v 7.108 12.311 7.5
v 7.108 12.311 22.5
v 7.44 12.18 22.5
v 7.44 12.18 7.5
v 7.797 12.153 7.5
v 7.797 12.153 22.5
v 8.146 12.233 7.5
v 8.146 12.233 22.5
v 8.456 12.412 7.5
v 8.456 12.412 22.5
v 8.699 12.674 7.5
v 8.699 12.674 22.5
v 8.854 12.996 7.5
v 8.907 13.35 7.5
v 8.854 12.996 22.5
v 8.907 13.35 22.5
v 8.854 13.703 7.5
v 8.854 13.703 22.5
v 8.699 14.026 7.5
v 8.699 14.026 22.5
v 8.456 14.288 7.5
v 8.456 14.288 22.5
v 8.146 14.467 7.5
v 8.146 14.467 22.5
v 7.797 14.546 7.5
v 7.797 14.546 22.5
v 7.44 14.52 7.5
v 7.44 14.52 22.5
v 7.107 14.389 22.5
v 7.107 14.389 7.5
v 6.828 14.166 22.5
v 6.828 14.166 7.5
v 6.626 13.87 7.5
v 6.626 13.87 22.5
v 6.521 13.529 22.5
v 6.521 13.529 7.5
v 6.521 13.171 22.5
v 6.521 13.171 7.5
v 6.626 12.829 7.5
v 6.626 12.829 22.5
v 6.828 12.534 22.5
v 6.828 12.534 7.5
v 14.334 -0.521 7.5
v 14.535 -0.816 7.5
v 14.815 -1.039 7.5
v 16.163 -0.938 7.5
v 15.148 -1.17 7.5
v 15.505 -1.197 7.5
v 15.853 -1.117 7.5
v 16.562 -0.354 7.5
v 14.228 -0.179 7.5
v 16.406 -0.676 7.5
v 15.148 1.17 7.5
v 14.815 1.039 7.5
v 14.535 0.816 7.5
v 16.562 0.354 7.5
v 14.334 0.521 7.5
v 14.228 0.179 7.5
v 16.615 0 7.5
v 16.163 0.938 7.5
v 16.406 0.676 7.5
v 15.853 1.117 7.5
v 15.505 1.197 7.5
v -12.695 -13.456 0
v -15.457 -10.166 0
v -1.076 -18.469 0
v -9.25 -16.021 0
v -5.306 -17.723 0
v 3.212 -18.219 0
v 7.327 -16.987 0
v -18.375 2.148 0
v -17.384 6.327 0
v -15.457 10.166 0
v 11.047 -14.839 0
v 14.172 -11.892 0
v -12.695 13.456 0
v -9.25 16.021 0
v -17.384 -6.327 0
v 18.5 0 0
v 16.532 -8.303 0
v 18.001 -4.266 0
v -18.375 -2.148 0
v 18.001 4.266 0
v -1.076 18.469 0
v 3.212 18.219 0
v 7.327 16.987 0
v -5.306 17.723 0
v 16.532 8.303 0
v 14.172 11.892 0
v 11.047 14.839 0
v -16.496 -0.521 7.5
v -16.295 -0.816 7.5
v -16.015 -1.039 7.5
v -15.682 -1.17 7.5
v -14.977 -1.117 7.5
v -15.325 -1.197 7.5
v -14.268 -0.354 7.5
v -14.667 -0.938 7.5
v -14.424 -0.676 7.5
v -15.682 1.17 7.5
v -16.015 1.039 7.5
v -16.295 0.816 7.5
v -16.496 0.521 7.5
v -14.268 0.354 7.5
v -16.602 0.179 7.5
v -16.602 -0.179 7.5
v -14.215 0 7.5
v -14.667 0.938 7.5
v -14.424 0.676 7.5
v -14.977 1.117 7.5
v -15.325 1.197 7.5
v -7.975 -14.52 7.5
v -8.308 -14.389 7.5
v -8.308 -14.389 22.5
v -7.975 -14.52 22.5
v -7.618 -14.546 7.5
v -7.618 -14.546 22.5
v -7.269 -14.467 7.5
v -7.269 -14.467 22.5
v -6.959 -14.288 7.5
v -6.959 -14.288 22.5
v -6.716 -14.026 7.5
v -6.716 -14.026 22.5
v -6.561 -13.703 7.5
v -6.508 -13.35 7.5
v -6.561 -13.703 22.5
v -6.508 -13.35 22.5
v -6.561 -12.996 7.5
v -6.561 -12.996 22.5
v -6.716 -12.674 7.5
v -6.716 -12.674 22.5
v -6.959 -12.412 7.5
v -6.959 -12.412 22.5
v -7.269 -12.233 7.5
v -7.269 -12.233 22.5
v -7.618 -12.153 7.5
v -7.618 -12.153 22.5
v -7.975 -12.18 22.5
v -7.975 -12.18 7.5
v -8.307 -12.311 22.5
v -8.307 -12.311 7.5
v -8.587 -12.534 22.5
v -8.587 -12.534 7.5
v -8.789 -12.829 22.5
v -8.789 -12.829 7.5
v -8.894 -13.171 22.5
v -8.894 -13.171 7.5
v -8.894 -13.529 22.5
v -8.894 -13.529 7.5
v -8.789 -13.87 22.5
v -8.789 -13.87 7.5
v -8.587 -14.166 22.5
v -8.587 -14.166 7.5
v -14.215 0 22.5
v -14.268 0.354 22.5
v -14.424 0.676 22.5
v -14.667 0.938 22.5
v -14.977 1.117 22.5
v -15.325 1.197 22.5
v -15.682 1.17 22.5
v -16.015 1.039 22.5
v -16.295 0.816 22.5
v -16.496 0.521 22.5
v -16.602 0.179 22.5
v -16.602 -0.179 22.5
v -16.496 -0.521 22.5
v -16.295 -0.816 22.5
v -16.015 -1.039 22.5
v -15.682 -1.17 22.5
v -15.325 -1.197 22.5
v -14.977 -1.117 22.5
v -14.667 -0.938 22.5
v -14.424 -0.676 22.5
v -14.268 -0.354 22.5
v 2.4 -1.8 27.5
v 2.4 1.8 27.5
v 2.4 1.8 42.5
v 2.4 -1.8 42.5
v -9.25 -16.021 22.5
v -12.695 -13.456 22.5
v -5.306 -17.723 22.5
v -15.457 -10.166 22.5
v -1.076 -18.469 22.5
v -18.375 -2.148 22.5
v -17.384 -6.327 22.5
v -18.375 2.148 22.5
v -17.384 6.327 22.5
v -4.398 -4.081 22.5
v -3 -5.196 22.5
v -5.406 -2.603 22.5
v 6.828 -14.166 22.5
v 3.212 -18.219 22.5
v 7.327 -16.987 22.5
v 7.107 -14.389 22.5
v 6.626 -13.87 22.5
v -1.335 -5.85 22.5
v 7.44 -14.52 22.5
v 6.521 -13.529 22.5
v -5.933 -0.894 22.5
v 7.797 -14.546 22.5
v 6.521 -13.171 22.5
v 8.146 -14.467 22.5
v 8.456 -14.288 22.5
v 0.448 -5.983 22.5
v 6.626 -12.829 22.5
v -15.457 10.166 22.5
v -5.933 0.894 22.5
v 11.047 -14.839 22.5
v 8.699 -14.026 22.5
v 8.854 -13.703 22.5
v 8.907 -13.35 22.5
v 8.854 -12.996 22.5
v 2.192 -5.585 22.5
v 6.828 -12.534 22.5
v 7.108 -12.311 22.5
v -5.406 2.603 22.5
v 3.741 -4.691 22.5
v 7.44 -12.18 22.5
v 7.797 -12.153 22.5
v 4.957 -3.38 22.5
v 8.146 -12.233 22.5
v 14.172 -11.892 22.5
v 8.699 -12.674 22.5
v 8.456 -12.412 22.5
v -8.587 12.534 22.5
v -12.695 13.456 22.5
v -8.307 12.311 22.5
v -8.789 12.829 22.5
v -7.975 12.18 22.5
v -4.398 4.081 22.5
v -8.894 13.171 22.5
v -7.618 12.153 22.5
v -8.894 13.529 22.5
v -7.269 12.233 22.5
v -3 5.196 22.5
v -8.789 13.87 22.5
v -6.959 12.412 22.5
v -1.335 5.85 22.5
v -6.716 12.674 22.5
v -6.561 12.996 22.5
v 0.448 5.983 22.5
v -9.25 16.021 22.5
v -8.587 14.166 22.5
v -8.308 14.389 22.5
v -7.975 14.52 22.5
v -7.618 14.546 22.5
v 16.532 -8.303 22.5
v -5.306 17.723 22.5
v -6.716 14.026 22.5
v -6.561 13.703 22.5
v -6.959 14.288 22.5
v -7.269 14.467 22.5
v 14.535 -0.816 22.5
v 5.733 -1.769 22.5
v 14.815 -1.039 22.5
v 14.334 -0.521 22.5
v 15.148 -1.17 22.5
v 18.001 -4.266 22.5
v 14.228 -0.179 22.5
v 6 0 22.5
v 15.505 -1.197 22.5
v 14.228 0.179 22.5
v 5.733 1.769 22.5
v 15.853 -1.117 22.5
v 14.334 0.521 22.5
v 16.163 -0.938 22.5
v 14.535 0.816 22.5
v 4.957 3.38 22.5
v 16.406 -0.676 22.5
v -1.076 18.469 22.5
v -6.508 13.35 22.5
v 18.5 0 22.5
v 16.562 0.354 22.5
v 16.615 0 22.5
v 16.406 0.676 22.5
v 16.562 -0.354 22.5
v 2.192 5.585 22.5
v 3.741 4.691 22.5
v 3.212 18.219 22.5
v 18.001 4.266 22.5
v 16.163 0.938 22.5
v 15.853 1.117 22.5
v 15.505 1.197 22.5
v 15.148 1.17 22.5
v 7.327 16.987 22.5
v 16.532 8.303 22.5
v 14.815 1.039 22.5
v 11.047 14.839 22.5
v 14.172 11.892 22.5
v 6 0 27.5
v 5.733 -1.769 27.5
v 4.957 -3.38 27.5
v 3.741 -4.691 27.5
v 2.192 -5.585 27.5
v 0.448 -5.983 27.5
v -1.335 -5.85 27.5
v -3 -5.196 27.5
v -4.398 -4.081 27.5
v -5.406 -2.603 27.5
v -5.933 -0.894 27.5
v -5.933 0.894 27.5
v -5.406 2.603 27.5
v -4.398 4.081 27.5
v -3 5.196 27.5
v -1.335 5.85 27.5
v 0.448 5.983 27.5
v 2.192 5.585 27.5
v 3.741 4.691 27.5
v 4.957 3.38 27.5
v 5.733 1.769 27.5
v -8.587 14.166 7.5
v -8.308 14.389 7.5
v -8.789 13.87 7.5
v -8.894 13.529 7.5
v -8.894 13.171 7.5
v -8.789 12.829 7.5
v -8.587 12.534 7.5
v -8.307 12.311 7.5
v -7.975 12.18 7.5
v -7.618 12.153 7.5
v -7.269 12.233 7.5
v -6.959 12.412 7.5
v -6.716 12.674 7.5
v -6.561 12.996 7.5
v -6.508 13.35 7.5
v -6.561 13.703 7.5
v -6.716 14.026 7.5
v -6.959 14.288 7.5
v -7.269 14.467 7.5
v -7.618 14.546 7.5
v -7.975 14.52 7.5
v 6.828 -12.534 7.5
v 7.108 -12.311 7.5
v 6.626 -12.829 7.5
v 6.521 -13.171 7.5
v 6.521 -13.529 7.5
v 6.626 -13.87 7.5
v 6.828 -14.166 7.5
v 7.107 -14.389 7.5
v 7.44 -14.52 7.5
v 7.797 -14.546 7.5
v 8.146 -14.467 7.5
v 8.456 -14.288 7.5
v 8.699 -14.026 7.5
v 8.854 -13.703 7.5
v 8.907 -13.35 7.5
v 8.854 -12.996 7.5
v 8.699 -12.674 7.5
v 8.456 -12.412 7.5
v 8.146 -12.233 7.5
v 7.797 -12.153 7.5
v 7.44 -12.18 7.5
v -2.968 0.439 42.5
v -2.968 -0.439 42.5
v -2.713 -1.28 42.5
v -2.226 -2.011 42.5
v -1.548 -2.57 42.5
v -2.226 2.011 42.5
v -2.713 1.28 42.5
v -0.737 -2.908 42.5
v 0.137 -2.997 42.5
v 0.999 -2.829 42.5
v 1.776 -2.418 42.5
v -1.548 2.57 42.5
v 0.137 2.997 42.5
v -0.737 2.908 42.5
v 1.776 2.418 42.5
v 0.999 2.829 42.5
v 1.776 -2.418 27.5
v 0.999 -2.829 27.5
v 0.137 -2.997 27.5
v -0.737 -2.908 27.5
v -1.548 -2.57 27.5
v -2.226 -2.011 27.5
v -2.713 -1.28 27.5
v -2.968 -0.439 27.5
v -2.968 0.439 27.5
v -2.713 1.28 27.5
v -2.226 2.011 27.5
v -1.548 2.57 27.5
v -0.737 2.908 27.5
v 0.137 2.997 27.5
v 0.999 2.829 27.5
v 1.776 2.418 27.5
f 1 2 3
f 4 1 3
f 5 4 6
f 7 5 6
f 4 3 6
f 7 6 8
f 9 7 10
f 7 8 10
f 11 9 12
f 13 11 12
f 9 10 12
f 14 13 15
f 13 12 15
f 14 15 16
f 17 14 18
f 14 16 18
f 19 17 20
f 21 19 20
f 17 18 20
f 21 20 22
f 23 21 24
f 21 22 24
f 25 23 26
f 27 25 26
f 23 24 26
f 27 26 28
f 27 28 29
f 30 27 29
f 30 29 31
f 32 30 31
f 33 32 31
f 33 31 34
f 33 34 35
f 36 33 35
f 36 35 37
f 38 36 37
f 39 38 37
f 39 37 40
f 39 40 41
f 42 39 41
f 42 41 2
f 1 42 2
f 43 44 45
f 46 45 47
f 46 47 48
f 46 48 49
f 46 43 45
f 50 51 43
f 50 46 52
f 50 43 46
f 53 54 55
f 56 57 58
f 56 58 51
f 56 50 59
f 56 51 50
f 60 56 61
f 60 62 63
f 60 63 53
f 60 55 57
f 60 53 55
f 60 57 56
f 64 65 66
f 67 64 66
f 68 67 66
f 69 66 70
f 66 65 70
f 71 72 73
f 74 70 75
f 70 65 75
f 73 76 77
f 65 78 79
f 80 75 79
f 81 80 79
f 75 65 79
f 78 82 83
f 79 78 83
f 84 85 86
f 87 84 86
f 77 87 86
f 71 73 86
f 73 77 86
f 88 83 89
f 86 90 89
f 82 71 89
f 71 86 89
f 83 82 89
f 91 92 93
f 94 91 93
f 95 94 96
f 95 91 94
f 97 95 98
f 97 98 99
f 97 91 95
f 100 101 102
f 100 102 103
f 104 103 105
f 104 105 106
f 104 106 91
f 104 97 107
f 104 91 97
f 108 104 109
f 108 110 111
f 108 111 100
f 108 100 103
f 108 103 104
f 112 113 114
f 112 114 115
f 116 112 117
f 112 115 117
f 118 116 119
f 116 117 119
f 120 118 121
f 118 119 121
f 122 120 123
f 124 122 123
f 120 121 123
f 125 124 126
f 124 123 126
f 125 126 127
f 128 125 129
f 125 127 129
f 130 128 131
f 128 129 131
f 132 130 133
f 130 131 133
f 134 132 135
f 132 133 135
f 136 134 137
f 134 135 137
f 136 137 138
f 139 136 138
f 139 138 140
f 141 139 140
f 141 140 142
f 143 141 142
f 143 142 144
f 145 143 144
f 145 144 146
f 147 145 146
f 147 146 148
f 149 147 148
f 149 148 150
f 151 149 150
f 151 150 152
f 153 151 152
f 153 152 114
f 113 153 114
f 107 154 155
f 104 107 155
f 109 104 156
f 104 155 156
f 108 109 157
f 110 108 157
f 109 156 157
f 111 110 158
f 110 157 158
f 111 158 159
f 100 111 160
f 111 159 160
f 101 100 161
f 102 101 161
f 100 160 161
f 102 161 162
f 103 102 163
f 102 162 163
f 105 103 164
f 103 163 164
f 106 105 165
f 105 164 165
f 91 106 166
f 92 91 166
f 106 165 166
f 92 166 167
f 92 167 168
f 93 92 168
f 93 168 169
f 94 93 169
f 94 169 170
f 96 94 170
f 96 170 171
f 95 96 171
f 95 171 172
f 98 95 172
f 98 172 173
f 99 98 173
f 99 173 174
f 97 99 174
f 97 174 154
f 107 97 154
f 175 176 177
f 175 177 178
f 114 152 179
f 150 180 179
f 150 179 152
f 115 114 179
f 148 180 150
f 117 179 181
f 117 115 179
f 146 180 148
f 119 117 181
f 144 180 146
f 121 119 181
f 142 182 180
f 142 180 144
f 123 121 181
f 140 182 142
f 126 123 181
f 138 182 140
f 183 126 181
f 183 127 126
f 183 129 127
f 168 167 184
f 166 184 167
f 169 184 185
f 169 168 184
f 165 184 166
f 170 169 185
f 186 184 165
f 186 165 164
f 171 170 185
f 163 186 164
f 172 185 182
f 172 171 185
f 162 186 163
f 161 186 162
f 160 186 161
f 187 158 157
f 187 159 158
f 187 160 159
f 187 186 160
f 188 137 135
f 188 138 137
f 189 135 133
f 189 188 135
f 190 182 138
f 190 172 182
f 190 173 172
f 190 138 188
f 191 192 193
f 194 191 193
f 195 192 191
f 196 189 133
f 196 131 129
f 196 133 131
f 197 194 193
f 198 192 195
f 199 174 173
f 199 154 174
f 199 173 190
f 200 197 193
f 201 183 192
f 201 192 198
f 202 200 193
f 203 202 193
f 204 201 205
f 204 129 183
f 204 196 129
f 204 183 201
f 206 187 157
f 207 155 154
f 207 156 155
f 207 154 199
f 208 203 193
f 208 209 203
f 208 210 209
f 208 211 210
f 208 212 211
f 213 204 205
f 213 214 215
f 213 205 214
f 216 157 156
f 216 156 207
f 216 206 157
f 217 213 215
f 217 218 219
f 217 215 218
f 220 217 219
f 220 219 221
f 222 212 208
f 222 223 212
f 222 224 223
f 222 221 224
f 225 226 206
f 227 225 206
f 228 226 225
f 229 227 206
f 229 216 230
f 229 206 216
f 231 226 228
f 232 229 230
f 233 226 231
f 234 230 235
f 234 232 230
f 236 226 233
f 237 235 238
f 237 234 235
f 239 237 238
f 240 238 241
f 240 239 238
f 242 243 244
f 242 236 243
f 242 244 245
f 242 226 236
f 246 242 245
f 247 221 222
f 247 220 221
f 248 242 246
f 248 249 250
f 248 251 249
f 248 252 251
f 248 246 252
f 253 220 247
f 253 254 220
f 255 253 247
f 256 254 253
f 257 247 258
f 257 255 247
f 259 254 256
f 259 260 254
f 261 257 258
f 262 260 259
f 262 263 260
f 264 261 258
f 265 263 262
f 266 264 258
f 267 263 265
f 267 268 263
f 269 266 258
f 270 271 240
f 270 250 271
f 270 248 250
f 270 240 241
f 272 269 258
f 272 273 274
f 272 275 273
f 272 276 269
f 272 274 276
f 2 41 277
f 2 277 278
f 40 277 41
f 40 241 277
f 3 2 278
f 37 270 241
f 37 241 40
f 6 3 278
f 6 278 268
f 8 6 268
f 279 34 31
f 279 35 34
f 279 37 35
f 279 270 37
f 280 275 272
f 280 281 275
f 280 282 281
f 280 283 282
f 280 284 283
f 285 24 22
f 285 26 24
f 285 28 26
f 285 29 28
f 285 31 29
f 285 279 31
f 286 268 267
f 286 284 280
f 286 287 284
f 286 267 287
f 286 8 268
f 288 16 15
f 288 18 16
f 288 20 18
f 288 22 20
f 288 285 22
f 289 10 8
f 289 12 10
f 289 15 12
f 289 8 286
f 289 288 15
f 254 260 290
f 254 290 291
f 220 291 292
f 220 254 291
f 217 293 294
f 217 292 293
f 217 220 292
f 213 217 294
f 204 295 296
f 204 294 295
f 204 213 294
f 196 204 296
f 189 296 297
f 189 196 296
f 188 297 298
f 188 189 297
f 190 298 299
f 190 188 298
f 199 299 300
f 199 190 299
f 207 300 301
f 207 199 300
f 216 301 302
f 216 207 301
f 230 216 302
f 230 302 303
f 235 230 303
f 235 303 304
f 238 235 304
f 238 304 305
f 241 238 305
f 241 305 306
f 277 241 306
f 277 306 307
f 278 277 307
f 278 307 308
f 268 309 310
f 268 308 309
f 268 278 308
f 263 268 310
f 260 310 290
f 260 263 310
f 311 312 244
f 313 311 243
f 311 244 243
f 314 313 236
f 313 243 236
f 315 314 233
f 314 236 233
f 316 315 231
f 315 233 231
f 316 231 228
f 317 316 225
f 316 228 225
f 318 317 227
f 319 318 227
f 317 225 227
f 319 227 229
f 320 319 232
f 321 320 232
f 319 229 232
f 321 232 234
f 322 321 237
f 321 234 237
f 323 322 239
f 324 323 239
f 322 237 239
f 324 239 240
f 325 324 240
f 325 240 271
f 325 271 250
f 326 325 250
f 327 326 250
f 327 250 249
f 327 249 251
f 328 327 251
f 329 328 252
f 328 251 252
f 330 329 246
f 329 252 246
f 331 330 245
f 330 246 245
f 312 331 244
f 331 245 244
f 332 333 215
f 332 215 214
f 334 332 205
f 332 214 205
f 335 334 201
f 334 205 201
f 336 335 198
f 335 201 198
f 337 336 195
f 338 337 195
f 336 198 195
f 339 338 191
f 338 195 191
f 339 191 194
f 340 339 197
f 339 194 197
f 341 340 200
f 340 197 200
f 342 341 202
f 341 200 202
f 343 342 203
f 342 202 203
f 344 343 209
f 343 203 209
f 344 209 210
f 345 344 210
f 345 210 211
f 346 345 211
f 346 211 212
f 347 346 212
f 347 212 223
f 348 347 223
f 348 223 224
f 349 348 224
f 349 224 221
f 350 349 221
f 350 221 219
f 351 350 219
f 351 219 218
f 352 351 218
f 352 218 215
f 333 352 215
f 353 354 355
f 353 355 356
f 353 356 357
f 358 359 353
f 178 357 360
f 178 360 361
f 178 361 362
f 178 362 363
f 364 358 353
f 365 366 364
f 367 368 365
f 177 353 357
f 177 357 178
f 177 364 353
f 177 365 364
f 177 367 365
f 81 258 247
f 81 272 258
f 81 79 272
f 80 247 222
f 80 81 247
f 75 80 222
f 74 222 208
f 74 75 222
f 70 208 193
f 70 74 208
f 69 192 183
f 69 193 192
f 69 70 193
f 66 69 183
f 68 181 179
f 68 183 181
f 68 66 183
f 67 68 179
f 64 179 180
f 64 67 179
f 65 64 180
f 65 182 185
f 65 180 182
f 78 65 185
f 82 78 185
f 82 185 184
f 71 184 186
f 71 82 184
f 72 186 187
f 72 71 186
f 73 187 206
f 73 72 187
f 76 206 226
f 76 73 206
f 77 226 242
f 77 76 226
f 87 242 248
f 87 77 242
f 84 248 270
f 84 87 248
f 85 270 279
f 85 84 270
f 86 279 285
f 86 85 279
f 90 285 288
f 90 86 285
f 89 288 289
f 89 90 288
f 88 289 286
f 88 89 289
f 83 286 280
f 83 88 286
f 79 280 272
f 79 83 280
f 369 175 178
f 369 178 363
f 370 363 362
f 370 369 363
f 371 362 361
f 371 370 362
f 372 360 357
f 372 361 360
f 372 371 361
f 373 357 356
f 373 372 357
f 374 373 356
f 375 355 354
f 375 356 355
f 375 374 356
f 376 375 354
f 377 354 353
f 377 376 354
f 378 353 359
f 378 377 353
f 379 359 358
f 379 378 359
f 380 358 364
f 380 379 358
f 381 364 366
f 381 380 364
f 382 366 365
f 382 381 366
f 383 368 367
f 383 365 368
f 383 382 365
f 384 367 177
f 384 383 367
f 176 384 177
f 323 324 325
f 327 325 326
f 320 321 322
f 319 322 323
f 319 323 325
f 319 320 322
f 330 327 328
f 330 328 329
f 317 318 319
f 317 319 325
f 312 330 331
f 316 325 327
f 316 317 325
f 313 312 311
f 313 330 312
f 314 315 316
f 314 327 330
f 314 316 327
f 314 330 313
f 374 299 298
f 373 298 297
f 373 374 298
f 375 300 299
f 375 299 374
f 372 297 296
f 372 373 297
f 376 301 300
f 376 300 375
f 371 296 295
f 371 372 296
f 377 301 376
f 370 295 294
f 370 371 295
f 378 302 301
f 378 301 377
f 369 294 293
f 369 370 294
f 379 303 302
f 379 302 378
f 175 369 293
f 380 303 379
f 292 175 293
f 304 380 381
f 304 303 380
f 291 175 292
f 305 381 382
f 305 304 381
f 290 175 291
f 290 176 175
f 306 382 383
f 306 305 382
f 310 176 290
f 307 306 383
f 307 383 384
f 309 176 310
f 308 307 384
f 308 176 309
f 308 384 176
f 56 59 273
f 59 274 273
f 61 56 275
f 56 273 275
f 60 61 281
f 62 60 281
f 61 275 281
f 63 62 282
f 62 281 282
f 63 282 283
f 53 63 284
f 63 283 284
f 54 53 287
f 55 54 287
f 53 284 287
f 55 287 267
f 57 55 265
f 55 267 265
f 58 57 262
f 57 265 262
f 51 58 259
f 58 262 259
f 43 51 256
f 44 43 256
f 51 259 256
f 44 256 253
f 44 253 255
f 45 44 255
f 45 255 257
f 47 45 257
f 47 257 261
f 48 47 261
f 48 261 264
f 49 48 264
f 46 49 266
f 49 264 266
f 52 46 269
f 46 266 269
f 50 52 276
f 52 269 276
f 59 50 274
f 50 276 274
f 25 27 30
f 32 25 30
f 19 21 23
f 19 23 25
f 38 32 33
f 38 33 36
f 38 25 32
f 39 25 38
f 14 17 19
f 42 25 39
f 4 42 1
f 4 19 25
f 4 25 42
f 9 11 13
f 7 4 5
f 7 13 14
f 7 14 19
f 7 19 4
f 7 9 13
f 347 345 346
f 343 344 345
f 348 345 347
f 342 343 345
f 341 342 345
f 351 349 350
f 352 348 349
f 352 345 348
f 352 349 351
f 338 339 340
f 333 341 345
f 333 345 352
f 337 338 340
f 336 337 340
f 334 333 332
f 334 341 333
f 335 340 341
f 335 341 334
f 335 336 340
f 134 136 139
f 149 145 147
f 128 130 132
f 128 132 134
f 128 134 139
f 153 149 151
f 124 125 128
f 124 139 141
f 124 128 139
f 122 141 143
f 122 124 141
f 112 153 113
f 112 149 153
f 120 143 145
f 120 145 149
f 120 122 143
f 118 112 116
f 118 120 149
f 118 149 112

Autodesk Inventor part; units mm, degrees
ref_plane "YZ Plane" through (0, 0, 0) normal (1, 0, 0) x (0, 1, 0)
ref_plane "XZ Plane" through (0, 0, 0) normal (0, 1, 0) x (-1, 0, 0)
ref_plane "XY Plane" through (0, 0, 0) normal (0, 0, 1) x (1, 0, 0)
sketch "Sketch1" plane through (0, 0, 0) normal (0, 0, 1) x (1, 0, 0)
  circle A0 centre (0, 0) radius 18.5
  dimension "d0" = 37
extrude "Extrusion1" add sketch "Sketch1" along normal blind 22.5
sketch "Sketch2" plane through (0, 0, 22.5) normal (0, 0, 1) x (1, 0, 0)
  circle A0 centre (0, 0) radius 6
  dimension "d3" = 12
extrude "Extrusion2" add sketch "Sketch2" along normal blind 5
sketch "Sketch3" plane through (0, 0, 27.5) normal (0, 0, 1) x (1, 0, 0)
  circle A0 centre (0, 0) radius 3
  line L0 (2.4, 1.8) -> (2.4, -1.8)
  line L1 (-3, 1.378) -> (-3, -1.1408) construction
  dimension "d6" = 6
  dimension "d7" = 5.4
extrude "Extrusion3" add sketch "Sketch3" along normal blind 15 contours L0 A0 picked at (0.2387, 0.7304)
sketch "Sketch4" plane through (0, 0, 22.5) normal (0, 0, 1) x (1, 0, 0)
  circle A0 centre (-15.415, 0) radius 1.2
  circle A1 centre (15.415, 0) radius 1.2
  arc A2 (2.4, 1.8) -> (2.4, -1.8) centre (0, 0) ccw projected
  line L0 (2.4, -1.8) -> (2.4, 1.8) projected
  circle A3 centre (0, 0) radius 15.415 construction
  dimension "d10" = 30.83
  dimension "d11" = 2.4
extrude "Extrusion4" cut sketch "Sketch4" against normal blind 15 contours A0 | A1
pattern_circular "Circular Pattern1" count 3 over 360 about axis through (0, 0, 0) along (0, 0, 1) of "Extrusion4"
properties part number "Gearbox"
